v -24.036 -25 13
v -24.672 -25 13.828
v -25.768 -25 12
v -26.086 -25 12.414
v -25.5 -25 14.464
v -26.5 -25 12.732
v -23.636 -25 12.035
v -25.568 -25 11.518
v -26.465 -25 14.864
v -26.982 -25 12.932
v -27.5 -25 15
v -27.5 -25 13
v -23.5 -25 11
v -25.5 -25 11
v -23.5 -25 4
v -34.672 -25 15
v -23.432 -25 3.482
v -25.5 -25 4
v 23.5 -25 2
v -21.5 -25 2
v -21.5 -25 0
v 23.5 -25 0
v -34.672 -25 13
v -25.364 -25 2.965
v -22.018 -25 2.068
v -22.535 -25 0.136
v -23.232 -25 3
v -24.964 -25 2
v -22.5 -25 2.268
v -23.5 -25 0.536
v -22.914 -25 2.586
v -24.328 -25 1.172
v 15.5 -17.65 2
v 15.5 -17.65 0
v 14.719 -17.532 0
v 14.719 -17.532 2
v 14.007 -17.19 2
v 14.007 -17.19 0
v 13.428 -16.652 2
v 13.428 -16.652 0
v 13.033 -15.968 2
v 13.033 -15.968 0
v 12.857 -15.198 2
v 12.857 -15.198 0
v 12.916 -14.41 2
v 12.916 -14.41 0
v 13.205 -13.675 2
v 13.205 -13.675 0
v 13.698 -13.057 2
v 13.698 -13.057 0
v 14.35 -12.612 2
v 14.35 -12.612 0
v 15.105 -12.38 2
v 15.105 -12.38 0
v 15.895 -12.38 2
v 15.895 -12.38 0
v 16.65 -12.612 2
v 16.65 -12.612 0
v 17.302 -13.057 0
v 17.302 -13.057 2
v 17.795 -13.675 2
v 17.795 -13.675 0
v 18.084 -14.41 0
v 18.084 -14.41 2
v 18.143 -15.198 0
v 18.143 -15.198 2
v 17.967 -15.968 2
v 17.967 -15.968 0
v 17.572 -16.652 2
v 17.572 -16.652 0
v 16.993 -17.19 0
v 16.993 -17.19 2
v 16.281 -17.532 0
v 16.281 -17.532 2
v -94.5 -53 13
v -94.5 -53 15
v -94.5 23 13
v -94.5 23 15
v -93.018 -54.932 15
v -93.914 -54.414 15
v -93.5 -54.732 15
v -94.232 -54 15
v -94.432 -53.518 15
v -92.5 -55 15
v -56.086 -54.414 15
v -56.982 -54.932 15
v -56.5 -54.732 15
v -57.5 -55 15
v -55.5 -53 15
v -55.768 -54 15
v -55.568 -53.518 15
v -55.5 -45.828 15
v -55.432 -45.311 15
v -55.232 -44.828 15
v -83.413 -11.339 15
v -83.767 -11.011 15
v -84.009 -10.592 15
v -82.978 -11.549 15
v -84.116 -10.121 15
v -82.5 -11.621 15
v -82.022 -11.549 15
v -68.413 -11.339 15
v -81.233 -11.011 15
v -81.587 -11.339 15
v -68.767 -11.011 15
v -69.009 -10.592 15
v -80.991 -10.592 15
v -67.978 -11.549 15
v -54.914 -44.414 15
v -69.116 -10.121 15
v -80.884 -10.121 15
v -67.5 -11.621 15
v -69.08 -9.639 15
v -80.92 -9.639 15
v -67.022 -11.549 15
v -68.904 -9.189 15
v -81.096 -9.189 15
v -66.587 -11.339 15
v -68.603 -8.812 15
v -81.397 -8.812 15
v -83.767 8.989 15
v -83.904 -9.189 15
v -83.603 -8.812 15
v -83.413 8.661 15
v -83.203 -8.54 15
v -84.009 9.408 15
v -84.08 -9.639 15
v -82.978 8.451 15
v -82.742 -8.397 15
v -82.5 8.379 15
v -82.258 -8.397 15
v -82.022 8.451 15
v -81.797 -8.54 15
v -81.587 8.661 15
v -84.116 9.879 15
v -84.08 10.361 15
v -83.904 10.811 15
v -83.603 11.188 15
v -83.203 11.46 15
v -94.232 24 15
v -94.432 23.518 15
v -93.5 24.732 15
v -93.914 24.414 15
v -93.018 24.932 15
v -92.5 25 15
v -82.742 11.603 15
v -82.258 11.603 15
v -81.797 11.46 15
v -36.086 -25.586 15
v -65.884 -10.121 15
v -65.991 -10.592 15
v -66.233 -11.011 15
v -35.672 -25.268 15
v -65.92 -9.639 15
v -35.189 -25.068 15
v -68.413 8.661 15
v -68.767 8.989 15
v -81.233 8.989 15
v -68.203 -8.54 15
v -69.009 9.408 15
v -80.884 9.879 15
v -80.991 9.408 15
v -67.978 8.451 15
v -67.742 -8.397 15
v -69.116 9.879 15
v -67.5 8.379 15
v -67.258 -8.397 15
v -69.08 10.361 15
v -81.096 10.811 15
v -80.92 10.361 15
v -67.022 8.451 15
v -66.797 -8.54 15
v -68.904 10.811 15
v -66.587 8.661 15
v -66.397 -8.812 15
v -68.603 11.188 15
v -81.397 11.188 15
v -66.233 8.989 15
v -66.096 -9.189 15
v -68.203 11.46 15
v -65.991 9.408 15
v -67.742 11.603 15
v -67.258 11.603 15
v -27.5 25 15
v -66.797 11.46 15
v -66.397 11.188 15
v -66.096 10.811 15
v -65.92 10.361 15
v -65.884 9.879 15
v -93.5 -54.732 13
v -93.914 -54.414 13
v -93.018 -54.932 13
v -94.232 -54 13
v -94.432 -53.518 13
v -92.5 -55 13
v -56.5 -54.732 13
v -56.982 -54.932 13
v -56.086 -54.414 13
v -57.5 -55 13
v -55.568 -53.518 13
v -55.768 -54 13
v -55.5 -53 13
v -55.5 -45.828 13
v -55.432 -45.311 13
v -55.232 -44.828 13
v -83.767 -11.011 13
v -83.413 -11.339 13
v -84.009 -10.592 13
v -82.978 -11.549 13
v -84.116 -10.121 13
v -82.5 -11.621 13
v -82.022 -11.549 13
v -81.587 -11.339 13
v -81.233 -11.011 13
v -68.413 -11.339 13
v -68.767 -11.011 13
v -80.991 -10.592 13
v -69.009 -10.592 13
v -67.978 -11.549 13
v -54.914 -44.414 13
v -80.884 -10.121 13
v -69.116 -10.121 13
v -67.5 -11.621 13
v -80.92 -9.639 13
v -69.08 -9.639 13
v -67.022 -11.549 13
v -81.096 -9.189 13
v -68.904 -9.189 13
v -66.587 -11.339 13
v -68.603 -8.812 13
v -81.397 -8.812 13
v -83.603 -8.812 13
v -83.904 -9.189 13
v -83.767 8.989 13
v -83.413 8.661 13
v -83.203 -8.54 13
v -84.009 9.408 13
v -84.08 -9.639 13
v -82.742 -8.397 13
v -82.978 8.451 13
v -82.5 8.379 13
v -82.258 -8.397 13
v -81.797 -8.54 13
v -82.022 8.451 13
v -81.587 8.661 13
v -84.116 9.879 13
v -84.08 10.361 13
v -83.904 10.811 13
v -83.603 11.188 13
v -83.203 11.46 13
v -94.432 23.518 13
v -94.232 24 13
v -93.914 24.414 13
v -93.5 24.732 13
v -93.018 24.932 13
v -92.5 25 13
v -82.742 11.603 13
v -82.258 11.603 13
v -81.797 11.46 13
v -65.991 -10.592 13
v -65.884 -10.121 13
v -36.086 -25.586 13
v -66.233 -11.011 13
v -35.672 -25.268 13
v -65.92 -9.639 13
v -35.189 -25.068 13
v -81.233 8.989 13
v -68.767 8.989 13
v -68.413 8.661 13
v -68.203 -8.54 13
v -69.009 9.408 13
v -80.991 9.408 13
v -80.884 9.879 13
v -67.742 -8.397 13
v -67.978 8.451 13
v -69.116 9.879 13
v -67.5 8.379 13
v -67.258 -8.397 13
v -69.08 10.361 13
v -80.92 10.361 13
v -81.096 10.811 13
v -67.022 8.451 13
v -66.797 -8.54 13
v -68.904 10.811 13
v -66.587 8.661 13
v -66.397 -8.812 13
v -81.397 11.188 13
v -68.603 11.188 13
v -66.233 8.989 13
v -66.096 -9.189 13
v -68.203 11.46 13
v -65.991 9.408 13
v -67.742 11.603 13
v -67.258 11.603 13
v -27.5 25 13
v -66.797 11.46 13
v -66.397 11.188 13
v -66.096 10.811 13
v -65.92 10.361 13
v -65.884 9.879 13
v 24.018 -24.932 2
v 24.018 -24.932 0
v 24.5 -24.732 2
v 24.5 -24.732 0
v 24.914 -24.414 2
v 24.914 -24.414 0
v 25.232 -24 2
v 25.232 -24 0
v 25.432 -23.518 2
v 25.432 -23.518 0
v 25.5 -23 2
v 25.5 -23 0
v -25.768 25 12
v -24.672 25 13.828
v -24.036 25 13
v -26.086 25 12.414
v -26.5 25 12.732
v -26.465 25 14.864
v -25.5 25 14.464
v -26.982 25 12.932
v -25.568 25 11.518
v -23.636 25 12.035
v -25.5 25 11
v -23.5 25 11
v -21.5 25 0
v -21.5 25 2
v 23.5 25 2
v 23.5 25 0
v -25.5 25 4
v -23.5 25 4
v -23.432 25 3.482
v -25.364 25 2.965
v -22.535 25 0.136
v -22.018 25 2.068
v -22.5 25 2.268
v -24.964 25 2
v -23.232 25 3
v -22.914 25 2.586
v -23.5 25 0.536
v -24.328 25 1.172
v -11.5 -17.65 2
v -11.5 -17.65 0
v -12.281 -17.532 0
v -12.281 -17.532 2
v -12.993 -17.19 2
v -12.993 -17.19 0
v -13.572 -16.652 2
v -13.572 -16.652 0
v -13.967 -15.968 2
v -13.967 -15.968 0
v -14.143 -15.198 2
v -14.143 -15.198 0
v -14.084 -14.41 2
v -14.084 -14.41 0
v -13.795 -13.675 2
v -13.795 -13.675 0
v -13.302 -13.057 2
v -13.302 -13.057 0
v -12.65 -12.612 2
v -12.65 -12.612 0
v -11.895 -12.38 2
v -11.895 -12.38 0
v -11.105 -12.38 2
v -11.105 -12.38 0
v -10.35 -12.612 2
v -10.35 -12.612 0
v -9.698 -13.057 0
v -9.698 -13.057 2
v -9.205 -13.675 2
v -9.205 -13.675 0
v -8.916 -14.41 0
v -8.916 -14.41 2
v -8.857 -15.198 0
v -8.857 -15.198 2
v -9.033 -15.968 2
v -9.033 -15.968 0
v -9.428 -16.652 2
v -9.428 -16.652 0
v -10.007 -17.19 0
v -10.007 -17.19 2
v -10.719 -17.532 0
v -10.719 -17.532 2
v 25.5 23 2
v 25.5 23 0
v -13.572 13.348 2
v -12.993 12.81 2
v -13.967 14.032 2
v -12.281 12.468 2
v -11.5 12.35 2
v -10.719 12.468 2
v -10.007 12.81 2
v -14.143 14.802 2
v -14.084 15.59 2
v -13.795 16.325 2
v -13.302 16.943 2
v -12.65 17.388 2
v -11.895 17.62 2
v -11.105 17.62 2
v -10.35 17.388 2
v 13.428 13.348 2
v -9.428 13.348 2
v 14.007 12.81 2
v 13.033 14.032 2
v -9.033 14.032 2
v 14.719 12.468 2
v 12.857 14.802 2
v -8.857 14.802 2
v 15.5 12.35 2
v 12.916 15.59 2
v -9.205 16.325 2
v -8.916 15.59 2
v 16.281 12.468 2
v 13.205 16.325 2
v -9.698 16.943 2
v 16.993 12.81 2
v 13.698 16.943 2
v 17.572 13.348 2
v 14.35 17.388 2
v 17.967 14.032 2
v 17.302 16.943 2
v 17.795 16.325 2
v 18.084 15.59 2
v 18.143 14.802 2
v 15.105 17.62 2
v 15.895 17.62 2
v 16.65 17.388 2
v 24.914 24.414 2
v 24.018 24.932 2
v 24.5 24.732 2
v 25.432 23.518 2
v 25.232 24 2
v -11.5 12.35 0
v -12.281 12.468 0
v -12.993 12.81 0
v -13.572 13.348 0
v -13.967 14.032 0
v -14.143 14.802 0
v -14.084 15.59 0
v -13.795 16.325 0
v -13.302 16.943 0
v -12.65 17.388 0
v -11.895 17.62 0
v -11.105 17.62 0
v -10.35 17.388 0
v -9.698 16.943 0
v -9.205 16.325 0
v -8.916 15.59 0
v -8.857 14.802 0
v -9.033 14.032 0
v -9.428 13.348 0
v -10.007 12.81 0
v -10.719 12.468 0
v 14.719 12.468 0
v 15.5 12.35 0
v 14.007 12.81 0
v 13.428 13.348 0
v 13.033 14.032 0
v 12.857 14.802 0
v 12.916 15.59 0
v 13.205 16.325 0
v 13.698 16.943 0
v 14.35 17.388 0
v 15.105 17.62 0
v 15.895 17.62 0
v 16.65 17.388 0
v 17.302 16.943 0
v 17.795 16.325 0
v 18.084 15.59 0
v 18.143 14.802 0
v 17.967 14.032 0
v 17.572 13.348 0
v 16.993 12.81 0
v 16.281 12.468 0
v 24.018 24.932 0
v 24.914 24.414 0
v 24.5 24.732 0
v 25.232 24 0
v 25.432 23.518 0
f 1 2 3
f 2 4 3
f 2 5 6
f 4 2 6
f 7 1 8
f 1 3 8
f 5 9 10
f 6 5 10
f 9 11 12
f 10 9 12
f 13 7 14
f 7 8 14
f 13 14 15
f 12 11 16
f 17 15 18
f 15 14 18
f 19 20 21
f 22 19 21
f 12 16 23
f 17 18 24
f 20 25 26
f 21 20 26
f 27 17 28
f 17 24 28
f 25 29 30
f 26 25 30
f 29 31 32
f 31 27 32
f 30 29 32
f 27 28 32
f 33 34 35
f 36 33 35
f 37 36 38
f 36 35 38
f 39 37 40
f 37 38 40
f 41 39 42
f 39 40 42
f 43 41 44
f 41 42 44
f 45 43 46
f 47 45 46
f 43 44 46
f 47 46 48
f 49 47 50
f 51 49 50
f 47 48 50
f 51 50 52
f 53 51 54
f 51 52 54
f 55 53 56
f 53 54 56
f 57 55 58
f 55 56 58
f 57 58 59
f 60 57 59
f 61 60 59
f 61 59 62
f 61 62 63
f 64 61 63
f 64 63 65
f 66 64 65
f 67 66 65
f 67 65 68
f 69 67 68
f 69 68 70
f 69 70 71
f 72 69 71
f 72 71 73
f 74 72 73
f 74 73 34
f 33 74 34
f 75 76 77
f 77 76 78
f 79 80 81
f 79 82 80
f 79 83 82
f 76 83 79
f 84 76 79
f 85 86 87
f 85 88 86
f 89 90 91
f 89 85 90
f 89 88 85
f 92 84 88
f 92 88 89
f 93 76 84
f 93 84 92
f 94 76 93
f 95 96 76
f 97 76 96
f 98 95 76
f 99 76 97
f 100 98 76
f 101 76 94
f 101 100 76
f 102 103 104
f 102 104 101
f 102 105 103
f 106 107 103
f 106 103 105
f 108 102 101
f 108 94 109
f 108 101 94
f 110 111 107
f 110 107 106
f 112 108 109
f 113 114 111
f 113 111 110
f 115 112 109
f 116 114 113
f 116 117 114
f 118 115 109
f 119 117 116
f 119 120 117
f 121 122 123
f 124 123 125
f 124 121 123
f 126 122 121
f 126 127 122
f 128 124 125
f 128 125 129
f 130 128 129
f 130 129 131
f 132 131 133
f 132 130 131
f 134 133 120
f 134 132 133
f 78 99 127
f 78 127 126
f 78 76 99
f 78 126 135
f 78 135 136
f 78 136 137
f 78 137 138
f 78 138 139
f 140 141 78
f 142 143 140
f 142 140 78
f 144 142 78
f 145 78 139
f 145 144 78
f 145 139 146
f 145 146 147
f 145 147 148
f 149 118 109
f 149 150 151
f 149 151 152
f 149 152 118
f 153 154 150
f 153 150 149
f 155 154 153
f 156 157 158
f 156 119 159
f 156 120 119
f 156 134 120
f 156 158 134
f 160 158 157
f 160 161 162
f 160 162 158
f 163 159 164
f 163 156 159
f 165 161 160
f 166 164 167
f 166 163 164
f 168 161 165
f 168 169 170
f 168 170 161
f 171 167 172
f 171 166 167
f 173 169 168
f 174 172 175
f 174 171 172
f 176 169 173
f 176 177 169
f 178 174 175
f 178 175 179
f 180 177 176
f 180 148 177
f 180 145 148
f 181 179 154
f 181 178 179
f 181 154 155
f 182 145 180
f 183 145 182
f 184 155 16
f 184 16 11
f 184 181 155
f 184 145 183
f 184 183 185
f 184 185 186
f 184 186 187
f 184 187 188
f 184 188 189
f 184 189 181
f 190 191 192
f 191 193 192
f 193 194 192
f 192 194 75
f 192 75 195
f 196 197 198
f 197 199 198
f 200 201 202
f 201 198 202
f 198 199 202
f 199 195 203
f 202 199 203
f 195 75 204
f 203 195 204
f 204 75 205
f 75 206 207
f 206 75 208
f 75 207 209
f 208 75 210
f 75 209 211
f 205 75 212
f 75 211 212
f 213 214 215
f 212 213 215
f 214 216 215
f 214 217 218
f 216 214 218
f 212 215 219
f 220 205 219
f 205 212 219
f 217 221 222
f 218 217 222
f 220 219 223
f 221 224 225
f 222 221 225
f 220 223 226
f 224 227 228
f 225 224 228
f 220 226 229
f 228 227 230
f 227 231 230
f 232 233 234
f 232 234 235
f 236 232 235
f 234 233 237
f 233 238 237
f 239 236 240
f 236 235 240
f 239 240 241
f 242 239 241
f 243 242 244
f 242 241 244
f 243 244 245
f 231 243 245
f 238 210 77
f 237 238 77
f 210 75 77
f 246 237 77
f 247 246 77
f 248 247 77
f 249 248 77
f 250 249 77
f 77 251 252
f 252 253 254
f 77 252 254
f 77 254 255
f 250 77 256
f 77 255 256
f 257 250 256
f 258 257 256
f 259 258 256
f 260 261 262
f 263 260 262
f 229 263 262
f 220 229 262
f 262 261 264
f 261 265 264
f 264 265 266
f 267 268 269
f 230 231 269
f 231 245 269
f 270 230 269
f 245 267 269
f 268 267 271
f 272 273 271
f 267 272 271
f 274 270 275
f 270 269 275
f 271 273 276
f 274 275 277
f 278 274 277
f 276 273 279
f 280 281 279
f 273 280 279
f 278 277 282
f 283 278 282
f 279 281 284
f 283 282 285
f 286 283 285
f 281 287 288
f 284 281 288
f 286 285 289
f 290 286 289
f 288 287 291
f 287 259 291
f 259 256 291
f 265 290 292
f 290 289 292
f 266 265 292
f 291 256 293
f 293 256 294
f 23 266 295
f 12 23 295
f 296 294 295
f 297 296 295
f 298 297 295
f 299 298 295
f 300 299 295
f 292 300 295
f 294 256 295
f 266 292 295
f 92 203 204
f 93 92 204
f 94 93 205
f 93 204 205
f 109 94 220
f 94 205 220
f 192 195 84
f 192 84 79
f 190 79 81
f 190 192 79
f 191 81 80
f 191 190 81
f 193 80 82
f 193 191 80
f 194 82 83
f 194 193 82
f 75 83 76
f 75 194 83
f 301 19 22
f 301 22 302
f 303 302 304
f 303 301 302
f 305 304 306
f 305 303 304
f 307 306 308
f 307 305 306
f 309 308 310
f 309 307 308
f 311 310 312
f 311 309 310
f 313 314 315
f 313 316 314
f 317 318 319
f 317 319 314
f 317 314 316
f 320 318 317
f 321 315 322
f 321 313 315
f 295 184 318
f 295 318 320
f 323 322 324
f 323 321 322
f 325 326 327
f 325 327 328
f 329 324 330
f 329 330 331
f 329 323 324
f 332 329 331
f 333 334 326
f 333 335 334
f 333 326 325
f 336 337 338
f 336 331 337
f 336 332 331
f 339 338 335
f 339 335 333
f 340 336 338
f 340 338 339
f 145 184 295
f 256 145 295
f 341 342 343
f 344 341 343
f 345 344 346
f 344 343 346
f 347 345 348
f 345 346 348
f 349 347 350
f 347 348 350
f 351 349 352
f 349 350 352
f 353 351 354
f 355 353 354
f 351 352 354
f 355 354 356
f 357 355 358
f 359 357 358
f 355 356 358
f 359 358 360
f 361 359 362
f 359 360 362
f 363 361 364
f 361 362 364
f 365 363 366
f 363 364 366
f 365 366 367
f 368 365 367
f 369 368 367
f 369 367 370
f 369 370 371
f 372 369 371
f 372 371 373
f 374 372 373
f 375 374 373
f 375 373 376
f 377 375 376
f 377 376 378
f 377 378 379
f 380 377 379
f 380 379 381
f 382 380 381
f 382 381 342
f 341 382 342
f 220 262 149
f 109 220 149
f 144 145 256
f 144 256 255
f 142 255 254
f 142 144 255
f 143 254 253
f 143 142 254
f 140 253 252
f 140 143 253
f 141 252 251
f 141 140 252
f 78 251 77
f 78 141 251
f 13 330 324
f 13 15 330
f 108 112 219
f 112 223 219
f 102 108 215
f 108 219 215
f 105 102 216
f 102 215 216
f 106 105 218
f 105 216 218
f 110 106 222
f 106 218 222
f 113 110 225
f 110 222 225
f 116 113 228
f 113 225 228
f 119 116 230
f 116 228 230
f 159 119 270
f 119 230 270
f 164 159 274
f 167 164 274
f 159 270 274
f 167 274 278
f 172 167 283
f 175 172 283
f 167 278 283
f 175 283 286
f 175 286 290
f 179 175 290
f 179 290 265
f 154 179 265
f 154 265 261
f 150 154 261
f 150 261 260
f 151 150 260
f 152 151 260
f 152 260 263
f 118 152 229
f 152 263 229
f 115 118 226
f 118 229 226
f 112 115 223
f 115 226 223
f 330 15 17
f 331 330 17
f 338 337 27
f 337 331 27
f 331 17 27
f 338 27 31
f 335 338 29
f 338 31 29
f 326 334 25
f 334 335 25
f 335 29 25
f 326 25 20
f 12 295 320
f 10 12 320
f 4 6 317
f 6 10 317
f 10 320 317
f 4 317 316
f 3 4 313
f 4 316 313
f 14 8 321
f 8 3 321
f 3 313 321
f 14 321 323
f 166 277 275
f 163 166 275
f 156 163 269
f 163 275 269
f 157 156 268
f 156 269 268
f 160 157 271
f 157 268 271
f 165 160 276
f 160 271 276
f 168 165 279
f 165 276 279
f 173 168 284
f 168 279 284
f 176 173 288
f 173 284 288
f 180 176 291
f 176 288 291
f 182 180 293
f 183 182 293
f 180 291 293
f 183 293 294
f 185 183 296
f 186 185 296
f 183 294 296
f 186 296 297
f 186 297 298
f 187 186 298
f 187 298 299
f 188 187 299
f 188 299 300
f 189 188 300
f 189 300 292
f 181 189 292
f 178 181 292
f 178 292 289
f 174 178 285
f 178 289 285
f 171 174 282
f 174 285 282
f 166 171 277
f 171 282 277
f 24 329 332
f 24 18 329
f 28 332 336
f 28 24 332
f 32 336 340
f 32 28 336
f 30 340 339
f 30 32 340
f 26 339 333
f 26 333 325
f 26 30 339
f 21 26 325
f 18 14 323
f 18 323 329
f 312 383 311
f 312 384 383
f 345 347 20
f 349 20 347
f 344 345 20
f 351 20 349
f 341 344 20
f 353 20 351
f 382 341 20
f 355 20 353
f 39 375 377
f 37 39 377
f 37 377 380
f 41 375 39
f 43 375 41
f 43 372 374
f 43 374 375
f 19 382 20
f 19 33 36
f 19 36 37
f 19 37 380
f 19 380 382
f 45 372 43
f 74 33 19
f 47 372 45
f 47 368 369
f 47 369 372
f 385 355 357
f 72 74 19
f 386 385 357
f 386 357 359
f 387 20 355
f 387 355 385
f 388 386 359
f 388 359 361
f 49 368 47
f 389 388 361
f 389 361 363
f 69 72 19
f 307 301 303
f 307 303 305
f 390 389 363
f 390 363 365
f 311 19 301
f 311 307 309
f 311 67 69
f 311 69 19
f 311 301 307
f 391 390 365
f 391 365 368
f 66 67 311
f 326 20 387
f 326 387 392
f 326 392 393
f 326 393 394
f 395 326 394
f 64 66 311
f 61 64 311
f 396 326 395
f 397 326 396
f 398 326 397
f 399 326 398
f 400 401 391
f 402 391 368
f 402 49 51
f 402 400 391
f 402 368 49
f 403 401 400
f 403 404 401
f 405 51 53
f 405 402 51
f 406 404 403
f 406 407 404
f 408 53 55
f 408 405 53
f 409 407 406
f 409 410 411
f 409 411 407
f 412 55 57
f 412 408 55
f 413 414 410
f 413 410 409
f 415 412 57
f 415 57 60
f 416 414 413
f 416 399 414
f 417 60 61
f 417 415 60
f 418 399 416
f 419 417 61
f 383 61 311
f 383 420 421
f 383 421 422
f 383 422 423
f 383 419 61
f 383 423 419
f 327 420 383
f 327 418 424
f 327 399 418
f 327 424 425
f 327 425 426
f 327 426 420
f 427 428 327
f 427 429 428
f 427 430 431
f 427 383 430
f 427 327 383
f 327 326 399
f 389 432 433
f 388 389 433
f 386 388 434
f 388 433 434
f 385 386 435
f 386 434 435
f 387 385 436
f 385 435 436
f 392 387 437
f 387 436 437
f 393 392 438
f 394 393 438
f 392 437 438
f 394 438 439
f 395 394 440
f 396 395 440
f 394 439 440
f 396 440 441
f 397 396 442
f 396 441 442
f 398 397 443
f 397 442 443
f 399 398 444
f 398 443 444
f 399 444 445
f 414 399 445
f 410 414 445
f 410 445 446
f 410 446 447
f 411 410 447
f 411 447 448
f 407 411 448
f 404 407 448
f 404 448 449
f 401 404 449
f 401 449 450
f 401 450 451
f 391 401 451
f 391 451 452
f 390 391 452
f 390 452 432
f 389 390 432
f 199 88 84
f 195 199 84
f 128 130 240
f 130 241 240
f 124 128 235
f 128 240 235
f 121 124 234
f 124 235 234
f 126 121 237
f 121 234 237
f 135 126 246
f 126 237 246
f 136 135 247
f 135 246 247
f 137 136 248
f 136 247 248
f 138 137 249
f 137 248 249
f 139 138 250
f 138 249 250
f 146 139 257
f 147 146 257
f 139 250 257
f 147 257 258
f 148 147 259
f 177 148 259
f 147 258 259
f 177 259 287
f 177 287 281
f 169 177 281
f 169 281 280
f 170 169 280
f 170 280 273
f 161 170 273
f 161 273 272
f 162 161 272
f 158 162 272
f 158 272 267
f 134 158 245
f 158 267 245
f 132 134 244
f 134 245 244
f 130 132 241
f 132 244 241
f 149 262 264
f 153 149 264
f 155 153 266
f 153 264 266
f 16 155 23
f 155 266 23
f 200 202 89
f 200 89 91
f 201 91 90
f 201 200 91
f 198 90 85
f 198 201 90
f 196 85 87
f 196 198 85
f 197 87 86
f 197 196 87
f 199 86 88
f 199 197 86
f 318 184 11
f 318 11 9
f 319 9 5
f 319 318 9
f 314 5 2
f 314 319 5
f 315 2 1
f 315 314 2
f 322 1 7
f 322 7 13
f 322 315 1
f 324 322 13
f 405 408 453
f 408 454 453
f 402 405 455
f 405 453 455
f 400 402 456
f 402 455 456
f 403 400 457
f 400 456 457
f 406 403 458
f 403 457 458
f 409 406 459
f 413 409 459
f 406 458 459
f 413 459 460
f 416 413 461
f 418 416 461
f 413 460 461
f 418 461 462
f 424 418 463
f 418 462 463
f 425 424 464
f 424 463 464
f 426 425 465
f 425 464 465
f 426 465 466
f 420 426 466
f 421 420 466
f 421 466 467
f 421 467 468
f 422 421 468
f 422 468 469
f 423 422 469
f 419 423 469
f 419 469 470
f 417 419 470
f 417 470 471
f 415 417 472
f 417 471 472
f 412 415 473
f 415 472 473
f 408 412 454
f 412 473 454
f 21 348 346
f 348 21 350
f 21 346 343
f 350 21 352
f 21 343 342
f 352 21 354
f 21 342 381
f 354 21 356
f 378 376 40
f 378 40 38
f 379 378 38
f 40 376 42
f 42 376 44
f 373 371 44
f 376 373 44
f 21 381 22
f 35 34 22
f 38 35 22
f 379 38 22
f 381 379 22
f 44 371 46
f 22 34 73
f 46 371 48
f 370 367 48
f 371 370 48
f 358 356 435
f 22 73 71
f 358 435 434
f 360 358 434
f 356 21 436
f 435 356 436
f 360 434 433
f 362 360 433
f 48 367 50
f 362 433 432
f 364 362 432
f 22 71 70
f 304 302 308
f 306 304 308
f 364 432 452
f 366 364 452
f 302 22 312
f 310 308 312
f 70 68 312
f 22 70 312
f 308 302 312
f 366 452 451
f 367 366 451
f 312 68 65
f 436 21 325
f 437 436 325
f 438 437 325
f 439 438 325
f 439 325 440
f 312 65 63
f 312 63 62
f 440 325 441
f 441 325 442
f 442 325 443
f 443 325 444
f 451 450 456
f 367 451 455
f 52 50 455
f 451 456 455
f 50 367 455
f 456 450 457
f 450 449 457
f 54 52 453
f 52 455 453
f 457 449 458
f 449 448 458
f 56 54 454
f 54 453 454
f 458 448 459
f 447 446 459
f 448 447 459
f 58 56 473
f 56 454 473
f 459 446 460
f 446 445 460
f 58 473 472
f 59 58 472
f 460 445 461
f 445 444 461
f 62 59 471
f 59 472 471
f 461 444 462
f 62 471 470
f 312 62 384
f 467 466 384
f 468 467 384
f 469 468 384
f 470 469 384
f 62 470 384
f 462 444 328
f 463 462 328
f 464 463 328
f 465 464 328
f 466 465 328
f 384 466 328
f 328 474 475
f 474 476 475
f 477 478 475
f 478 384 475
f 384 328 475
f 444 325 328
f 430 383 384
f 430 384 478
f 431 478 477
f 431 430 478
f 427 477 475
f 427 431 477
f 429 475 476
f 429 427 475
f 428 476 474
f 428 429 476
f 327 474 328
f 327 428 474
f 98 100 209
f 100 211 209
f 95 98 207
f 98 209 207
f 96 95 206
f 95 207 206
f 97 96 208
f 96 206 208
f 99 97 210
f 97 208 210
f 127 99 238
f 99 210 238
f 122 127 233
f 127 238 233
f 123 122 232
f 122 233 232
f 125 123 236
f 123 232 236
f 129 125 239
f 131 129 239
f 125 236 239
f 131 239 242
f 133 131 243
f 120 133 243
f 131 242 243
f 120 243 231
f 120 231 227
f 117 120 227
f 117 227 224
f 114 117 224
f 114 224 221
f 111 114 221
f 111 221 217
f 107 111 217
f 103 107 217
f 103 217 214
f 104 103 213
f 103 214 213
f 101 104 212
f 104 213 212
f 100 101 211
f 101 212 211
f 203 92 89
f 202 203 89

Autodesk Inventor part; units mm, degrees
ref_plane "YZ Plane" through (0, 0, 0) normal (1, 0, 0) x (0, 1, 0)
ref_plane "XZ Plane" through (0, 0, 0) normal (0, 1, 0) x (-1, 0, 0)
ref_plane "XY Plane" through (0, 0, 0) normal (0, 0, 1) x (1, 0, 0)
sketch "スケッチ1" plane through (0, 0, 0) normal (0, 0, 1) x (1, 0, 0)
  line L0 (25.5, -25) -> (-25.5, -25)
  line L1 (-25.5, -25) -> (-25.5, 25)
  line L2 (-25.5, 25) -> (25.5, 25)
  line L3 (25.5, 25) -> (25.5, -25)
  line L4 (25.5, -25) -> (-25.5, 25) construction
  line L5 (-25.5, -25) -> (25.5, 25) construction
  point P0 (0, 0)
  dimension "d0" = 51
  dimension "d1" = 50
extrude "プレート1" add sketch "スケッチ1" along normal blind 2
sketch "スケッチ2" plane through (-23.5, -25, 0) normal (-1, 0, 0) x (0, -1, 0)
  line L0 (-50, 0) -> (0, 0)
  line L1 (0, 0) -> (0, 15)
  line L2 (0, 15) -> (-50, 15)
  line L3 (-50, 15) -> (-50, 0)
edge flange "フランジ1" height 15 angle 90 thickness 2 bend radius 2 thickness toward (-1, 0, 0) relief tear relief width 2 relief depth 1 edges at (-25.5, 0, 2) wall of the first edge with corners at (-23.5, 25, 0) (-23.5, -25, 0) (-23.5, -25, 15) (-23.5, 25, 15)
bend "曲げ1"
corner "コーナー1"
sketch "スケッチ3" plane through (-23.5, 25, 13) normal (0, 0, 1) x (1, 0, 0)
  line L0 (0, -50) -> (0, 0)
  line L1 (0, 0) -> (-71, 0)
  line L2 (-71, 0) -> (-71, -50)
  line L3 (-71, -50) -> (0, -50)
edge flange "フランジ2" height 71 angle 90 thickness 2 bend radius 2 thickness toward (0, 0, 1) relief tear relief width 2 relief depth 1 edges at (-25.5, 0, 15) wall of the first edge with corners at (-23.5, -25, 13) (-23.5, 25, 13) (-94.5, 25, 13) (-94.5, -25, 13)
bend "曲げ2"
corner "コーナー2"
sketch "スケッチ4" plane through (0, 0, 2) normal (0, 0, 1) x (1, 0, 0)
  line L0 (-11.5, -15) -> (15.5, -15)
  line L1 (15.5, -15) -> (15.5, 15)
  line L2 (15.5, 15) -> (-11.5, 15)
  line L3 (-11.5, 15) -> (-11.5, -15)
  line L4 (-11.5, -15) -> (15.5, 15) construction
  line L5 (15.5, -15) -> (-11.5, 15) construction
  line L6 (-21.5, 25) -> (25.5, 25) projected
  line L7 (25.5, 25) -> (25.5, -25) projected
  point P0 (0, 0)
  point P1 (2, 0)
  dimension "d23" = 27
  dimension "d25" = 30
  dimension "d26" = 10
  dimension "d27" = 10
hole "穴1" at (-11.5, 15, 2) at (-11.5, -15, 2) at (15.5, -15, 2) at (15.5, 15, 2) direction (0, 0, -1) diameter 5.3 depth 2 tip angle 118
fillet "フィレット1" radius 2 3 edges at (25.5, 25, 1) (25.5, -25, 1) (-94.5, 25, 14)
sketch "スケッチ5" plane through (-27.5, -25, 15) normal (0, 0, 1) x (1, 0, 0)
  line L0 (0, 0) -> (-67, 0) projected
  line L1 (0, 0) -> (0, 50) projected
  line L2 (-65, 50) -> (0, 50) projected
  arc A0 (-65, 50) -> (-67, 48) centre (-65, 48) ccw projected
  line L3 (-67, 0) -> (-67, 48) projected
  line L4 (-55, 15) -> (-40, 15)
  line L5 (-40, 15) -> (-40, 35)
  line L6 (-40, 35) -> (-55, 35)
  line L7 (-55, 35) -> (-55, 15)
  line L8 (-55, 15) -> (-40, 35) construction
  line L9 (-40, 15) -> (-55, 35) construction
  point P0 (27.5, 25)
  point P1 (-47.5, 25)
  dimension "d36" = 15
  dimension "d37" = 19.5
  dimension "d38" = 20
  dimension "d39" = 15
hole "穴2" at (-82.5, 10, 15) at (-82.5, -10, 15) at (-67.5, -10, 15) at (-67.5, 10, 15) direction (0, 0, -1) diameter 3.242 depth 11.8 tip angle 118 thread size "M4x0.7" class "6H" standard "ISO Metric profile"
sketch "スケッチ6" plane through (-94.5, -25, 15) normal (0, 0, 1) x (1, 0, 0)
  circle A0 centre (27, 15) radius 1.621 projected
  circle A1 centre (12, 35) radius 1.621 projected
  circle A2 centre (12, 15) radius 1.621 projected
  circle A3 centre (27, 35) radius 1.621 projected
  arc A4 (2, 50) -> (0, 48) centre (2, 48) ccw projected
  line L0 (0, 0) -> (0, 48) projected
  line L1 (67, 0) -> (0, 0) projected
  line L2 (67, 0) -> (67, 50) projected
  line L3 (2, 50) -> (67, 50) projected
  line L4 (0, 0) -> (39, 0)
  line L5 (39, 0) -> (39, -30)
  line L6 (39, -30) -> (0, -30)
  line L7 (0, -30) -> (0, 0)
  point P0 (94.5, 25)
  point P1 (39, 0)
  dimension "d47" = 39
  dimension "d48" = 80
extrude "押し出し1" add sketch "スケッチ6" against normal up to surface (2 mm away) contours L1 L5 L6 L7
chamfer "面取り1" distance 20 angle 45 1 edges at (-55.5, -25, 14)
fillet "フィレット2" radius 2 4 edges at (-94.5, -55, 14) (-55.5, -55, 14) (-55.5, -45, 14) (-35.5, -25, 14)
equation "\"d33\" = Thickness"
equation "\"d2\" = Thickness"
equation "\"d3\" = BendReliefWidth"
equation "\"d4\" = BendReliefDepth"
equation "\"d5\" = MinimumRemnant"
equation "\"d6\" = TransitionRadius"
equation "\"d9\" = BendRadius"
equation "\"d10\" = CornerReliefSize"
equation "\"d11\" = GapSize"
equation "\"d12\" = JacobiRadiusSize"
equation "\"d13\" = BendReliefWidth"
equation "\"d14\" = BendReliefDepth"
equation "\"d15\" = MinimumRemnant"
equation "\"d16\" = TransitionRadius"
equation "\"d19\" = BendRadius"
equation "\"d20\" = CornerReliefSize"
equation "\"d21\" = GapSize"
equation "\"d22\" = JacobiRadiusSize"
equation "\"BendRadius\" = Thickness"
equation "\"BendReliefWidth\" = Thickness"
equation "\"BendReliefDepth\" = 0.5 * Thickness"
equation "\"CornerReliefSize\" = 4 * Thickness"
equation "\"MinimumRemnant\" = 2 * Thickness"
equation "\"TransitionRadius\" = BendRadius"
equation "\"JacobiRadiusSize\" = BendRadius"
equation "\"GapSize\" = Thickness"
equation "\"Thickness\" = 2"
properties part number "DragChain_Guide_B"
